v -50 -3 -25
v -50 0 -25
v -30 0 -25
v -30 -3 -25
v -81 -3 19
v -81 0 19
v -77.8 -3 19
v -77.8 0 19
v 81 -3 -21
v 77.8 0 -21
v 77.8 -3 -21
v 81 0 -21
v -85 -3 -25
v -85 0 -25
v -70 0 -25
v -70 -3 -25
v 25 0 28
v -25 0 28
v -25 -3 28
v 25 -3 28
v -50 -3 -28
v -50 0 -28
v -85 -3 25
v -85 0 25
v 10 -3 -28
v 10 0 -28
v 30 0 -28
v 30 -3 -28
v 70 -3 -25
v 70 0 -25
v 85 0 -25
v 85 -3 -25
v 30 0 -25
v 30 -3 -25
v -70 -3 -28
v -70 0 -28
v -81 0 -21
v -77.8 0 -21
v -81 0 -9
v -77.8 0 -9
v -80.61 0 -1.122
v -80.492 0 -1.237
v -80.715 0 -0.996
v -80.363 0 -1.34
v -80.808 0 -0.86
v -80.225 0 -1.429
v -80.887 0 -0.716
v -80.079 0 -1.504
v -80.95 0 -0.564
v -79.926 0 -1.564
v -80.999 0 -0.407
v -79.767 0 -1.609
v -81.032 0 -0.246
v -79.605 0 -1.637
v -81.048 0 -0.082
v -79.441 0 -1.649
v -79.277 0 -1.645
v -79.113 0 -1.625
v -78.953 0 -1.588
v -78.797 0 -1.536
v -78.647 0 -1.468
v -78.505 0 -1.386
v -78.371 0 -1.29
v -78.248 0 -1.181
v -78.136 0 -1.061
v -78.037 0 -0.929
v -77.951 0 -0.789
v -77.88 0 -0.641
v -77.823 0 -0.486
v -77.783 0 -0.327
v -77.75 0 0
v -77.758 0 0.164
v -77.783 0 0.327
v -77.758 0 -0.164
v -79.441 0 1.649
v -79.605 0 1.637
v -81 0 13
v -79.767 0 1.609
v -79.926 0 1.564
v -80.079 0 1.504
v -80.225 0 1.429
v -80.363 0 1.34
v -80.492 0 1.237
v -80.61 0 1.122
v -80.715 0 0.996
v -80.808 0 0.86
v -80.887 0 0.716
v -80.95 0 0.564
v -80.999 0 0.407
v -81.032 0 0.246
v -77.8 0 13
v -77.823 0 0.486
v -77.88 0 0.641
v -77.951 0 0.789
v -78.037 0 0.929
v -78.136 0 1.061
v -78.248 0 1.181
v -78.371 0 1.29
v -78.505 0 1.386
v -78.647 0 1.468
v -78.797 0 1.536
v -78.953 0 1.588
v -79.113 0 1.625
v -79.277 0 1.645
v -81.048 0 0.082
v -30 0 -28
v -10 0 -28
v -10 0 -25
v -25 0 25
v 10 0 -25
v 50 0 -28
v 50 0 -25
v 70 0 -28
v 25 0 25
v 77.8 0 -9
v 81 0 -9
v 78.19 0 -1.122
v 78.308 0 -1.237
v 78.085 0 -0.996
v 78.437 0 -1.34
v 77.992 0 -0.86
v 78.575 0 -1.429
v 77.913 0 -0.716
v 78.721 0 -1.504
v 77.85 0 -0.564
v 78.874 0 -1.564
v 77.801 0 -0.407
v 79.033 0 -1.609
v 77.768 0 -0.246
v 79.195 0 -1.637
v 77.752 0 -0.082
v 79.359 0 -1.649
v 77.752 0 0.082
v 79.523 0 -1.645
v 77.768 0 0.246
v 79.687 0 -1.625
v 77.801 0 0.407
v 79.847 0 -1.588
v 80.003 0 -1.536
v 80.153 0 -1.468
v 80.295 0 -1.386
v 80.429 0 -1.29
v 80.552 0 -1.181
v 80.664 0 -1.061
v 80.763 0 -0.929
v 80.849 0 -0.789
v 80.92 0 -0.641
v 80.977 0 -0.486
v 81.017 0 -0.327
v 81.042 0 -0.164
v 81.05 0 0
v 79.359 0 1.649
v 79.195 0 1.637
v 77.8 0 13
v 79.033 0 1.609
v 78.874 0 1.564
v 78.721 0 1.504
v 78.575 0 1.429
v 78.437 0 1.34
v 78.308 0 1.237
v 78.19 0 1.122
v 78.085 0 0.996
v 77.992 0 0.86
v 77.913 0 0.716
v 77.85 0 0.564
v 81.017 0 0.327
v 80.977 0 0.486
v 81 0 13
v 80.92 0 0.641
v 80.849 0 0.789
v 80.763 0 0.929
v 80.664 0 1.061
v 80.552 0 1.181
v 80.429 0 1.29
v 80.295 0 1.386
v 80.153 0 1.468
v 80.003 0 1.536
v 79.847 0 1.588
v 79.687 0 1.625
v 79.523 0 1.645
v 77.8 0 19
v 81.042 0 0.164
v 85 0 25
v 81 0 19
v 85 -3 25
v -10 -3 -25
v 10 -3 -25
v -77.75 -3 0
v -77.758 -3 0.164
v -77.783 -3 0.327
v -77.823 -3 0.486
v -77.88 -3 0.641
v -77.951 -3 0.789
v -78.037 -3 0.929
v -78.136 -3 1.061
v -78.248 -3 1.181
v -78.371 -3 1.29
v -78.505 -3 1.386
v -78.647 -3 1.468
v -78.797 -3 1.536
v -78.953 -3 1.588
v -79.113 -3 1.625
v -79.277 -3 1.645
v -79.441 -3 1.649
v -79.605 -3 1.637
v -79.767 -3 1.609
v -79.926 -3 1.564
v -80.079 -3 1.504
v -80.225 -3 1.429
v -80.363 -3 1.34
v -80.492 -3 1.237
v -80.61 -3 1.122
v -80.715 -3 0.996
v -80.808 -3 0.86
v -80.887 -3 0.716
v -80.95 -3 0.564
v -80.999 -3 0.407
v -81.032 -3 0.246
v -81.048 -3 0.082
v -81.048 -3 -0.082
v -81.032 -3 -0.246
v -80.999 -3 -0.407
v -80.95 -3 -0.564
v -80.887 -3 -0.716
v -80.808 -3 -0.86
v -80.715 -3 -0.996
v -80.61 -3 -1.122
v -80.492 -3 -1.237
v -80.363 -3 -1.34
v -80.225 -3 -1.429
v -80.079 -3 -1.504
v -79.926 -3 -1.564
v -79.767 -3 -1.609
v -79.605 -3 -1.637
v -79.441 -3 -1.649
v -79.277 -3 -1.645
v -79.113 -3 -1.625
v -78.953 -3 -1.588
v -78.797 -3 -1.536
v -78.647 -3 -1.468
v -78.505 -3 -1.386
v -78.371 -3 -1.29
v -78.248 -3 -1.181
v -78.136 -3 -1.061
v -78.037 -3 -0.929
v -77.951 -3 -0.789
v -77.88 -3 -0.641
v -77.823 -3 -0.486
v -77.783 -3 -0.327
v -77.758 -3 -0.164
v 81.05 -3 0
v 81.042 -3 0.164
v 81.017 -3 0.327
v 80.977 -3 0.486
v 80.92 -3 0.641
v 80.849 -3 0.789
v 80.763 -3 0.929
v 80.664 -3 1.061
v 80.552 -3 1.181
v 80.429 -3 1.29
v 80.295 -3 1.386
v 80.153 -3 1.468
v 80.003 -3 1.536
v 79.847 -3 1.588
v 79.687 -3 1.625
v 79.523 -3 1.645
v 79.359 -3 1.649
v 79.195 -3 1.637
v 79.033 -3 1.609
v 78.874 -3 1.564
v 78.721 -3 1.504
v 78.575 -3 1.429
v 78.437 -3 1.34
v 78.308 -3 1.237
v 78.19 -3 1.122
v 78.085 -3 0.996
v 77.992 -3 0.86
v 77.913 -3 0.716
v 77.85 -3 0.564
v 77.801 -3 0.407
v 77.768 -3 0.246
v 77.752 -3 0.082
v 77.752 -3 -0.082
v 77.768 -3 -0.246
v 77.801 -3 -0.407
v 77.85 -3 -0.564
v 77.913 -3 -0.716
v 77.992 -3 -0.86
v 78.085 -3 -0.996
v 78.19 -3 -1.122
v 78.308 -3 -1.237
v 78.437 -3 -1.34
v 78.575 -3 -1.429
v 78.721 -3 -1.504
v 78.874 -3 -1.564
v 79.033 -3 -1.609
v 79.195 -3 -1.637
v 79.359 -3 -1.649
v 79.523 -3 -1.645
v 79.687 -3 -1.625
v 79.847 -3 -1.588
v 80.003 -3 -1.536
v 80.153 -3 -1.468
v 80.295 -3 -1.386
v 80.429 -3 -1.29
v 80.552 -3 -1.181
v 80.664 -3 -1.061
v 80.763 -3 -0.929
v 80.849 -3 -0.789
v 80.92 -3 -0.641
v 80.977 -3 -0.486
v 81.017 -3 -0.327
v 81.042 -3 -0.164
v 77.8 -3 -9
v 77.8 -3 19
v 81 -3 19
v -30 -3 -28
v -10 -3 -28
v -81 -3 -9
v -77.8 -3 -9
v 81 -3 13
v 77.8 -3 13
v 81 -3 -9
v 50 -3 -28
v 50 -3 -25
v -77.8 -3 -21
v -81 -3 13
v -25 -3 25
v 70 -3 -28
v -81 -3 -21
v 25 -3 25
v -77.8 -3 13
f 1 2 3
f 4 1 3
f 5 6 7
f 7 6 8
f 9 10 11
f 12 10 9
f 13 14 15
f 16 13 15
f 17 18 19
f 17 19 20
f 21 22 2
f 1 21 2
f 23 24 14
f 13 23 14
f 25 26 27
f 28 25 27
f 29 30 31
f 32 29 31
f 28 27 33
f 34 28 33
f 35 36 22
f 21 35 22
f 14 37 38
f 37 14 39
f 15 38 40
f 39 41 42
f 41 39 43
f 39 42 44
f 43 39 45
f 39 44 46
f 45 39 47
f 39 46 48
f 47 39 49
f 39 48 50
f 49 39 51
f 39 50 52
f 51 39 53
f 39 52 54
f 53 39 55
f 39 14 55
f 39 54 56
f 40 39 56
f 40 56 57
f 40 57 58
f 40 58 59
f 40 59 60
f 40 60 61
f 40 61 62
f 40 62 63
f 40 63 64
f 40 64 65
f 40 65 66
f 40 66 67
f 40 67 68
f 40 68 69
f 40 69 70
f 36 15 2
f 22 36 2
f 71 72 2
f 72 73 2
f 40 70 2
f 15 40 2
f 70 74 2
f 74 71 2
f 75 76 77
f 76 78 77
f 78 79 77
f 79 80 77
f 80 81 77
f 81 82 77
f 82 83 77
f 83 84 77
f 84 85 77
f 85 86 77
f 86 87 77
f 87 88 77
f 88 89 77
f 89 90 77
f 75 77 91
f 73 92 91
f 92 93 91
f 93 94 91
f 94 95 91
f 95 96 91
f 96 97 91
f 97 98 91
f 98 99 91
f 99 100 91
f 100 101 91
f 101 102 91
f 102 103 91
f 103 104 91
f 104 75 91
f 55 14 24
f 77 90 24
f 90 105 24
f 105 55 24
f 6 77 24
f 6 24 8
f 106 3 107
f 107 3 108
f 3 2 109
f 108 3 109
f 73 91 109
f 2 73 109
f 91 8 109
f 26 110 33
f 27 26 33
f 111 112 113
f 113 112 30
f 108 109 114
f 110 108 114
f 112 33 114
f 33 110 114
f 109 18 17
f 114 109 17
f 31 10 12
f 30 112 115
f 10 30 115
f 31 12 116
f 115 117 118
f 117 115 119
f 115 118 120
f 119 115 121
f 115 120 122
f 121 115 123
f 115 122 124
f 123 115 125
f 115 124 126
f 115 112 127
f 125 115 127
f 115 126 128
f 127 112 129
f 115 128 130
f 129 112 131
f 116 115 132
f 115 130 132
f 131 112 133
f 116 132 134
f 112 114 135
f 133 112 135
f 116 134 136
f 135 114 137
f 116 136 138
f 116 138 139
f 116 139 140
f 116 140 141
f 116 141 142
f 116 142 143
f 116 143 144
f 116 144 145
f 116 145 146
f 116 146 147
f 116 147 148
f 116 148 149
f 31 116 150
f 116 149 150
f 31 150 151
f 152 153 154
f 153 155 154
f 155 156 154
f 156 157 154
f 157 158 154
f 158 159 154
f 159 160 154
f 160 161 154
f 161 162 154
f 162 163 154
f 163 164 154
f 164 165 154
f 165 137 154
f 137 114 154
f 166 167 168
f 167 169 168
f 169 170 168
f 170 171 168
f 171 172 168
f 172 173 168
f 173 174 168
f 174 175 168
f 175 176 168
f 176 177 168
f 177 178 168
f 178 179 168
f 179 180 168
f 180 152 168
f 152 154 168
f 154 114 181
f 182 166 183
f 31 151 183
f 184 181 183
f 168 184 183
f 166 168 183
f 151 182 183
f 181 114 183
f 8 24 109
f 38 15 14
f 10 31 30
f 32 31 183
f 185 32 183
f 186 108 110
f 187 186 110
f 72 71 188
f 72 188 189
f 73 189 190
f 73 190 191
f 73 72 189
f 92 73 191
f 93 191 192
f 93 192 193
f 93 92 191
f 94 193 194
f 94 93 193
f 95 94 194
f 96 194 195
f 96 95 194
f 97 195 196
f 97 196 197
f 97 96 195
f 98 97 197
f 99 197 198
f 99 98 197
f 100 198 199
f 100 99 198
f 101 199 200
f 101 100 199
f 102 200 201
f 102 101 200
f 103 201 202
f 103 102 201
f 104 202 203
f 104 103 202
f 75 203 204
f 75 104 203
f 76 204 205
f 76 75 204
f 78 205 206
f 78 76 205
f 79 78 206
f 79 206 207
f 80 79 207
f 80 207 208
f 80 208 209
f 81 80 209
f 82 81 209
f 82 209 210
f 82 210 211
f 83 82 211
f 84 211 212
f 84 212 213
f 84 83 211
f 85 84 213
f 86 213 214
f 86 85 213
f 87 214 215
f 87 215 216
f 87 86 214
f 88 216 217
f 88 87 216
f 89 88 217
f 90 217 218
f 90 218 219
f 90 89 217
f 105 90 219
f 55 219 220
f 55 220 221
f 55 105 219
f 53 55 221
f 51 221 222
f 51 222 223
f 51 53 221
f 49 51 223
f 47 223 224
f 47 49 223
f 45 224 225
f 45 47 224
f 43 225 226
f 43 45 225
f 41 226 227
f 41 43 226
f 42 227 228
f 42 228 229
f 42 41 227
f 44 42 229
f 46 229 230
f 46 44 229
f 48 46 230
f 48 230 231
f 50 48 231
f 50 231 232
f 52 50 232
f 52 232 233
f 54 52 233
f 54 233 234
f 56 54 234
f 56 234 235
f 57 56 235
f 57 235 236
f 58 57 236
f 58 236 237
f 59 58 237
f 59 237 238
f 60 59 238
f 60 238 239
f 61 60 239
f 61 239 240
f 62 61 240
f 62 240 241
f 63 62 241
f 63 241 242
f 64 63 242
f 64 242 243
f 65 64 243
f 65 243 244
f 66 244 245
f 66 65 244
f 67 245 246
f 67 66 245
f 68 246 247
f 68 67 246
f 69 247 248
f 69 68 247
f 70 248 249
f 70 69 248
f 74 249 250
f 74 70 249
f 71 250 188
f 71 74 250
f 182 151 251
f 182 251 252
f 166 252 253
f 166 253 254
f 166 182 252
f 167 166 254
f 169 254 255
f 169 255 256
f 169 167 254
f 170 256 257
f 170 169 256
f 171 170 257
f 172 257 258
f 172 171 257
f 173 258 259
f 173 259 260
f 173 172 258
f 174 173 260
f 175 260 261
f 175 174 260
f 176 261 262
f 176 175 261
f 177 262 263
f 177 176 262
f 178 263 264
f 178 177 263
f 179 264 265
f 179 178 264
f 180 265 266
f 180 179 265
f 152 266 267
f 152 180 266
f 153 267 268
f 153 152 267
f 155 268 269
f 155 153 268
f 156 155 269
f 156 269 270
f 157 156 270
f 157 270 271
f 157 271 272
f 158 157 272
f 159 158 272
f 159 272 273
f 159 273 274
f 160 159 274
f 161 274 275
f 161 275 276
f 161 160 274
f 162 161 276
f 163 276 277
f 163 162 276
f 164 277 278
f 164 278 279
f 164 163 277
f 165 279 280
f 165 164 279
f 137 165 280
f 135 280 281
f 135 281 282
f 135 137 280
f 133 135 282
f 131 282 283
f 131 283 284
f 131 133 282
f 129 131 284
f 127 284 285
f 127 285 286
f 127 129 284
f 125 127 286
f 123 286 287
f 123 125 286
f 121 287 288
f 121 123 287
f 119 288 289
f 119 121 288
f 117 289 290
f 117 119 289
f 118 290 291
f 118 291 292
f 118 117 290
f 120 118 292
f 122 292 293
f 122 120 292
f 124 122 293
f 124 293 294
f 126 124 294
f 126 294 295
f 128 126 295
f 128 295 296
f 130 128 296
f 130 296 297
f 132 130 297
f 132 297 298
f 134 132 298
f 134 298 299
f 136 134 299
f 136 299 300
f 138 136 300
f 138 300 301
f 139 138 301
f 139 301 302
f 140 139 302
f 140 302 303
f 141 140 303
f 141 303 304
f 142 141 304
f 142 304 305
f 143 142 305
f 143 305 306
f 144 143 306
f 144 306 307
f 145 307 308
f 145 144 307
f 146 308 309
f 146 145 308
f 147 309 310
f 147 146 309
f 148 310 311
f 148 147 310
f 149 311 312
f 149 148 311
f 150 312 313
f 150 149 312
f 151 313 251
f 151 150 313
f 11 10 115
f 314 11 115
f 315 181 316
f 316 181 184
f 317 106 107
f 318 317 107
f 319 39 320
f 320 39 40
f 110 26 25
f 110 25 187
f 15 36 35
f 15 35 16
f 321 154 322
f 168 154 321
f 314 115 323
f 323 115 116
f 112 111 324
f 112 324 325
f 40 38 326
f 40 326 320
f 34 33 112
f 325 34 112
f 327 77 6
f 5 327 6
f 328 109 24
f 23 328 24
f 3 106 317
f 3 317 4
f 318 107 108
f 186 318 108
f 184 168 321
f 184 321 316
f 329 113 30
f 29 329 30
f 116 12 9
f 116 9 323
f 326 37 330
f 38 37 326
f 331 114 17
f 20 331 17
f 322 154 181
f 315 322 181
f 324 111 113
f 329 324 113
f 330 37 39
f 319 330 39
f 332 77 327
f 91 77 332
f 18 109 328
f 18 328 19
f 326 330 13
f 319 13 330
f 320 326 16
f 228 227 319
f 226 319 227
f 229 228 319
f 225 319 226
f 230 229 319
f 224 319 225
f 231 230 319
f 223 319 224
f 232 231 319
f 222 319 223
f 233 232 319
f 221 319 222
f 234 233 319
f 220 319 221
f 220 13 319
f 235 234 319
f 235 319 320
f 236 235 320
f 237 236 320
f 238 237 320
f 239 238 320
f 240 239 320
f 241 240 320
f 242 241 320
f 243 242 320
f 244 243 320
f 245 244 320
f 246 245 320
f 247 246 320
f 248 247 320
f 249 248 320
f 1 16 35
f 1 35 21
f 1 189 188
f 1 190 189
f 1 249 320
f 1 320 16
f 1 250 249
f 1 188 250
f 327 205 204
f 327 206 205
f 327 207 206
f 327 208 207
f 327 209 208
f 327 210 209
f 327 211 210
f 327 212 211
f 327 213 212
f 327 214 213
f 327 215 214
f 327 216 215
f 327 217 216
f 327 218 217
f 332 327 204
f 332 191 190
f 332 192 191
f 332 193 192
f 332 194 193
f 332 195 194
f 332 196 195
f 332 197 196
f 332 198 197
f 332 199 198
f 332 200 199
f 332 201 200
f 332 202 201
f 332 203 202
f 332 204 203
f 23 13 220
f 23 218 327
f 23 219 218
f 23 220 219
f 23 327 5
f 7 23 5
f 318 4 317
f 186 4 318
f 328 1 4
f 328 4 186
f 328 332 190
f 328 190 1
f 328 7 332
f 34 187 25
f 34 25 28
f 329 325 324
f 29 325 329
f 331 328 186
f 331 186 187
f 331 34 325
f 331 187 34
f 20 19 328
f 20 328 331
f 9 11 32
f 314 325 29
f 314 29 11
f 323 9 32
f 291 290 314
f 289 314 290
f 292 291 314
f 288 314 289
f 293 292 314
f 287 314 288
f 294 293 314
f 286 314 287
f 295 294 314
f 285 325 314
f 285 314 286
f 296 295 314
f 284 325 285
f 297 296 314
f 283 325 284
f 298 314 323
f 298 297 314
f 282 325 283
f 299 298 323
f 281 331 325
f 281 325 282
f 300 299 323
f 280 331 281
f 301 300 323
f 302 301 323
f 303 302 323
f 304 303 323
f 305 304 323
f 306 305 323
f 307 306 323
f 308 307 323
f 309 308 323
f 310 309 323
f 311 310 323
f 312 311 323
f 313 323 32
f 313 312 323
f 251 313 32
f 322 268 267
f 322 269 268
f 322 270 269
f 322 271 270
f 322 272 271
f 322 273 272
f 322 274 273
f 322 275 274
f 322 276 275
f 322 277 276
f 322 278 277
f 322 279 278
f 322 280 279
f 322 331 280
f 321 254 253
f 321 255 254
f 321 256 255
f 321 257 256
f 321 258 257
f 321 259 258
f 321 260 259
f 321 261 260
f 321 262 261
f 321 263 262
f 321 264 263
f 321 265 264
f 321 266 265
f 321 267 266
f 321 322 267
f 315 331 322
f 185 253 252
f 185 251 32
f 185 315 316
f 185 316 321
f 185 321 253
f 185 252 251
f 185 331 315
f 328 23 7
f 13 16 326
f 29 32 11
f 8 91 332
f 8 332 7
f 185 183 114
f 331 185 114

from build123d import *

# Parameters (mm, degrees)
F0_W     = 3.2
F0_H     = 12
F0_R     = 1.65
F0_H_2   = 6
F0_W_2   = 50
F0_H_3   = 3
F0_W_3   = 20
F1_DEPTH = 3


with BuildPart() as f1:
    # F0 (on Front) → F1 (new body)
    with BuildSketch(Plane.XZ):
        Polygon((70, -25), (85, -25), (85, 25), (25, 25), (-25, 25), (-85, 25), (-85, -25), (-70, -25), (-50, -25), (-30, -25), (-10, -25), (10, -25), (30, -25), (50, -25), align=None)
        with Locations((-79.4, -15)):
            Rectangle(F0_W, F0_H, mode=Mode.SUBTRACT)
        with Locations((79.4, -15)):
            Rectangle(F0_W, F0_H, mode=Mode.SUBTRACT)
        with Locations((-79.4, 0)):
            Circle(F0_R, mode=Mode.SUBTRACT)
        with Locations((-79.4, 16)):
            Rectangle(F0_W, F0_H_2, mode=Mode.SUBTRACT)
        with Locations((79.4, 0)):
            Circle(F0_R, mode=Mode.SUBTRACT)
        with Locations((79.4, 16)):
            Rectangle(F0_W, F0_H_2, mode=Mode.SUBTRACT)
        with Locations((0, 26.5)):
            Rectangle(F0_W_2, F0_H_3)
        with Locations((-60, -26.5)):
            Rectangle(F0_W_3, F0_H_3)
        with Locations((-20, -26.5)):
            Rectangle(F0_W_3, F0_H_3)
        with Locations((20, -26.5)):
            Rectangle(F0_W_3, F0_H_3)
        with Locations((60, -26.5)):
            Rectangle(F0_W_3, F0_H_3)
    extrude(amount=F1_DEPTH)


solid = f1.part
